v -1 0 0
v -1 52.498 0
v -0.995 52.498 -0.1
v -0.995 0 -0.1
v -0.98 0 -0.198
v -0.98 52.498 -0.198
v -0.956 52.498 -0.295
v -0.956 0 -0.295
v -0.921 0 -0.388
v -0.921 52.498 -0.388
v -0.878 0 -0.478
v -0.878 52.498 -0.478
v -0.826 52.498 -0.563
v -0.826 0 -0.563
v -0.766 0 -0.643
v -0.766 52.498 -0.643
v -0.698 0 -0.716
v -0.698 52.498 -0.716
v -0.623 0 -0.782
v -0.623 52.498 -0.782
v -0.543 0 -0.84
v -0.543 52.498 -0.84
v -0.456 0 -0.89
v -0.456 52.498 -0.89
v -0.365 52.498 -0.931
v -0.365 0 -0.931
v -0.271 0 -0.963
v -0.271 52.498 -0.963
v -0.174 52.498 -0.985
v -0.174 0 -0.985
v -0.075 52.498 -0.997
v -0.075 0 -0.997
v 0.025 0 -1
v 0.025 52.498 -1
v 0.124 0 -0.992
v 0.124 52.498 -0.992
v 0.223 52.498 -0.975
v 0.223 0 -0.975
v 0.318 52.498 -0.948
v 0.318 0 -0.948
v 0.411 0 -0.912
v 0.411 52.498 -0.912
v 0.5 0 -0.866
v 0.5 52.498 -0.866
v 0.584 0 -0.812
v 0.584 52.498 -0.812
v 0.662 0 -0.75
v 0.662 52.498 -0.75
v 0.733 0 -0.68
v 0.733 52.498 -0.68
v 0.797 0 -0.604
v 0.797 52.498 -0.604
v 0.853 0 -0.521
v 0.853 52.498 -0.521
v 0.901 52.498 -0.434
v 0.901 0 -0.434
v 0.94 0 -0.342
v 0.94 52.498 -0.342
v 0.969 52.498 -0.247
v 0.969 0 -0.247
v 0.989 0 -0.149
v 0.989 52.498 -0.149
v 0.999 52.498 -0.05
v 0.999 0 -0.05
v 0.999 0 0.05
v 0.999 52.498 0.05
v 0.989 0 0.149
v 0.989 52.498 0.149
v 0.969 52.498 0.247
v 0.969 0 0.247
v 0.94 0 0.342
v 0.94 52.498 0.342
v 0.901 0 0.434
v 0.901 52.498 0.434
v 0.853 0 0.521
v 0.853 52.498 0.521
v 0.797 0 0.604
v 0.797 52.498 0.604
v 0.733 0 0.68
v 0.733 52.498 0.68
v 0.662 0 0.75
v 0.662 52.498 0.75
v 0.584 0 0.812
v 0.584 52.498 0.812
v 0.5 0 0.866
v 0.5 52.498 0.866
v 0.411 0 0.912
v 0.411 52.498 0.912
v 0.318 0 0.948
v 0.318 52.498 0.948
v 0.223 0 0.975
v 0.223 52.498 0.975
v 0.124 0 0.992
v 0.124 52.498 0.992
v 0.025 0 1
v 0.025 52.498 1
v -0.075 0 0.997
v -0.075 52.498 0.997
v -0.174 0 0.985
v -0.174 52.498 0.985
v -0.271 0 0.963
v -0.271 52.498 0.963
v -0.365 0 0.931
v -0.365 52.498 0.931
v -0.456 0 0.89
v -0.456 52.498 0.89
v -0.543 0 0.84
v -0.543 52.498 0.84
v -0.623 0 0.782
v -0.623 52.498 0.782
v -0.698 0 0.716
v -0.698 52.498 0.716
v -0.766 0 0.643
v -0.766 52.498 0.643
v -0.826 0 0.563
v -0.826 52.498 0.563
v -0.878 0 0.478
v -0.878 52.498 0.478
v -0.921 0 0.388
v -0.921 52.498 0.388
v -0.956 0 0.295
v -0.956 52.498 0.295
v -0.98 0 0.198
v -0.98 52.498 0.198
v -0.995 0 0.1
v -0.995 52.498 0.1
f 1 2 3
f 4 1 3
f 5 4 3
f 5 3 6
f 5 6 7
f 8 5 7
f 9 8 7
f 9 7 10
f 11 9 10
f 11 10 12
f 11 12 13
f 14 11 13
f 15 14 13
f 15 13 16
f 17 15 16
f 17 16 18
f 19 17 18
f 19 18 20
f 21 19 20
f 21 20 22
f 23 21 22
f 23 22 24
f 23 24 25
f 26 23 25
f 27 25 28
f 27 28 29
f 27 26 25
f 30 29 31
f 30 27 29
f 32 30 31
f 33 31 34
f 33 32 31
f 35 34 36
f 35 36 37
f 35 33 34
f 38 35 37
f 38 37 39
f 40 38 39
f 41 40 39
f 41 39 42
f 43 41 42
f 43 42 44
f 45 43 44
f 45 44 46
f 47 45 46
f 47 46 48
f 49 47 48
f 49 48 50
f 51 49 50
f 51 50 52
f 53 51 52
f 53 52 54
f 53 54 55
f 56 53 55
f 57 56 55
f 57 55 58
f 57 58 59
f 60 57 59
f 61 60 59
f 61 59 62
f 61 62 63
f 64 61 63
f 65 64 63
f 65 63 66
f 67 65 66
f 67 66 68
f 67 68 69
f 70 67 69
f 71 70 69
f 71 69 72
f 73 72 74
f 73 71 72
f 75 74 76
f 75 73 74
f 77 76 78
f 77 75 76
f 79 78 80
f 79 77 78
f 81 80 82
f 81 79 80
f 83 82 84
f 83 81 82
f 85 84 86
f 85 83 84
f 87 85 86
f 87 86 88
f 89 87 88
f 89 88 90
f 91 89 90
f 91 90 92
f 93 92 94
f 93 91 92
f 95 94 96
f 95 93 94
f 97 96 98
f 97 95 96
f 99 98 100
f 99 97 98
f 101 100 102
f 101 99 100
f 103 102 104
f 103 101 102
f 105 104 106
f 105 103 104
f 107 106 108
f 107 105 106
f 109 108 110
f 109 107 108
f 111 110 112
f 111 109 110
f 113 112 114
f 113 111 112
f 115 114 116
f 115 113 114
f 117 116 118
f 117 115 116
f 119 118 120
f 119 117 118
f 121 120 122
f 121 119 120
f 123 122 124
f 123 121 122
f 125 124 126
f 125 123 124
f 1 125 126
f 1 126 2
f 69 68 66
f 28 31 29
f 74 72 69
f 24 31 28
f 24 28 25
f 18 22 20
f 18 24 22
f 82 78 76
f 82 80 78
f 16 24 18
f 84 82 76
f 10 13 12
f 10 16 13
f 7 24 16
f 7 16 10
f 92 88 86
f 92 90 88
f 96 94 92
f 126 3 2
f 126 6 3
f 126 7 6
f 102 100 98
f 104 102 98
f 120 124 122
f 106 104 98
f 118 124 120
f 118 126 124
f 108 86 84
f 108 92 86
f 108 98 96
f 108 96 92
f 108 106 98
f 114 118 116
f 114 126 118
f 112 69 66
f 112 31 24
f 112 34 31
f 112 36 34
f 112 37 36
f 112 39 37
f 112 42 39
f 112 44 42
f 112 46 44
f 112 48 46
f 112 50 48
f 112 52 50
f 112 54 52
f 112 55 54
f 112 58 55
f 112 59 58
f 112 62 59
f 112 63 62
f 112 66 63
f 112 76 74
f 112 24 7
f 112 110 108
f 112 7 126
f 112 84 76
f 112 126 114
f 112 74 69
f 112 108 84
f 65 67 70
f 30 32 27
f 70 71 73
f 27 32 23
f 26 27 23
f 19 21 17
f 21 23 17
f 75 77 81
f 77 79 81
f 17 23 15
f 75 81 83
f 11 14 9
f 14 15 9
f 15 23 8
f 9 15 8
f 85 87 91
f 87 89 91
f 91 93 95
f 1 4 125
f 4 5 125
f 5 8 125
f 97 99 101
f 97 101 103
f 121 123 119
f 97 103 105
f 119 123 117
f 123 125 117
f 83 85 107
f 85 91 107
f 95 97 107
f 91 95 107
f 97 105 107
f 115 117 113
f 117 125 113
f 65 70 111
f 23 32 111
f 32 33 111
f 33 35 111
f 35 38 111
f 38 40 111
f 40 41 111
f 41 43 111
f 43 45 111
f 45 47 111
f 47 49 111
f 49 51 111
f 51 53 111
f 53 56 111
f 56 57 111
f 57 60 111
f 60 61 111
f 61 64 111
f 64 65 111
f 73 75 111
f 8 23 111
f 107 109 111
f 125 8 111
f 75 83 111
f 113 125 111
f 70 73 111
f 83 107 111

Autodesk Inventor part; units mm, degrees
ref_plane "YZ Plane" through (0, 0, 0) normal (1, 0, 0) x (0, 1, 0)
ref_plane "XZ Plane" through (0, 0, 0) normal (0, 1, 0) x (-1, 0, 0)
ref_plane "XY Plane" through (0, 0, 0) normal (0, 0, 1) x (1, 0, 0)
sketch "Sketch1" plane through (0, 0, 0) normal (0, 1, 0) x (-1, 0, 0)
  circle A0 centre (0, 0) radius 1
  dimension "d0" = 2
extrude "Extrusion1" add sketch "Sketch1" along normal blind 55
move faces "Move1" translate (0, -2.5, 0) faces at (-0.5848, 55, -0.397)
move faces "Move2" translate (0, -0.002, 0) faces at (-0.2495, 52.5, 0.221)
properties part number "LOOP1_COLL_L"
